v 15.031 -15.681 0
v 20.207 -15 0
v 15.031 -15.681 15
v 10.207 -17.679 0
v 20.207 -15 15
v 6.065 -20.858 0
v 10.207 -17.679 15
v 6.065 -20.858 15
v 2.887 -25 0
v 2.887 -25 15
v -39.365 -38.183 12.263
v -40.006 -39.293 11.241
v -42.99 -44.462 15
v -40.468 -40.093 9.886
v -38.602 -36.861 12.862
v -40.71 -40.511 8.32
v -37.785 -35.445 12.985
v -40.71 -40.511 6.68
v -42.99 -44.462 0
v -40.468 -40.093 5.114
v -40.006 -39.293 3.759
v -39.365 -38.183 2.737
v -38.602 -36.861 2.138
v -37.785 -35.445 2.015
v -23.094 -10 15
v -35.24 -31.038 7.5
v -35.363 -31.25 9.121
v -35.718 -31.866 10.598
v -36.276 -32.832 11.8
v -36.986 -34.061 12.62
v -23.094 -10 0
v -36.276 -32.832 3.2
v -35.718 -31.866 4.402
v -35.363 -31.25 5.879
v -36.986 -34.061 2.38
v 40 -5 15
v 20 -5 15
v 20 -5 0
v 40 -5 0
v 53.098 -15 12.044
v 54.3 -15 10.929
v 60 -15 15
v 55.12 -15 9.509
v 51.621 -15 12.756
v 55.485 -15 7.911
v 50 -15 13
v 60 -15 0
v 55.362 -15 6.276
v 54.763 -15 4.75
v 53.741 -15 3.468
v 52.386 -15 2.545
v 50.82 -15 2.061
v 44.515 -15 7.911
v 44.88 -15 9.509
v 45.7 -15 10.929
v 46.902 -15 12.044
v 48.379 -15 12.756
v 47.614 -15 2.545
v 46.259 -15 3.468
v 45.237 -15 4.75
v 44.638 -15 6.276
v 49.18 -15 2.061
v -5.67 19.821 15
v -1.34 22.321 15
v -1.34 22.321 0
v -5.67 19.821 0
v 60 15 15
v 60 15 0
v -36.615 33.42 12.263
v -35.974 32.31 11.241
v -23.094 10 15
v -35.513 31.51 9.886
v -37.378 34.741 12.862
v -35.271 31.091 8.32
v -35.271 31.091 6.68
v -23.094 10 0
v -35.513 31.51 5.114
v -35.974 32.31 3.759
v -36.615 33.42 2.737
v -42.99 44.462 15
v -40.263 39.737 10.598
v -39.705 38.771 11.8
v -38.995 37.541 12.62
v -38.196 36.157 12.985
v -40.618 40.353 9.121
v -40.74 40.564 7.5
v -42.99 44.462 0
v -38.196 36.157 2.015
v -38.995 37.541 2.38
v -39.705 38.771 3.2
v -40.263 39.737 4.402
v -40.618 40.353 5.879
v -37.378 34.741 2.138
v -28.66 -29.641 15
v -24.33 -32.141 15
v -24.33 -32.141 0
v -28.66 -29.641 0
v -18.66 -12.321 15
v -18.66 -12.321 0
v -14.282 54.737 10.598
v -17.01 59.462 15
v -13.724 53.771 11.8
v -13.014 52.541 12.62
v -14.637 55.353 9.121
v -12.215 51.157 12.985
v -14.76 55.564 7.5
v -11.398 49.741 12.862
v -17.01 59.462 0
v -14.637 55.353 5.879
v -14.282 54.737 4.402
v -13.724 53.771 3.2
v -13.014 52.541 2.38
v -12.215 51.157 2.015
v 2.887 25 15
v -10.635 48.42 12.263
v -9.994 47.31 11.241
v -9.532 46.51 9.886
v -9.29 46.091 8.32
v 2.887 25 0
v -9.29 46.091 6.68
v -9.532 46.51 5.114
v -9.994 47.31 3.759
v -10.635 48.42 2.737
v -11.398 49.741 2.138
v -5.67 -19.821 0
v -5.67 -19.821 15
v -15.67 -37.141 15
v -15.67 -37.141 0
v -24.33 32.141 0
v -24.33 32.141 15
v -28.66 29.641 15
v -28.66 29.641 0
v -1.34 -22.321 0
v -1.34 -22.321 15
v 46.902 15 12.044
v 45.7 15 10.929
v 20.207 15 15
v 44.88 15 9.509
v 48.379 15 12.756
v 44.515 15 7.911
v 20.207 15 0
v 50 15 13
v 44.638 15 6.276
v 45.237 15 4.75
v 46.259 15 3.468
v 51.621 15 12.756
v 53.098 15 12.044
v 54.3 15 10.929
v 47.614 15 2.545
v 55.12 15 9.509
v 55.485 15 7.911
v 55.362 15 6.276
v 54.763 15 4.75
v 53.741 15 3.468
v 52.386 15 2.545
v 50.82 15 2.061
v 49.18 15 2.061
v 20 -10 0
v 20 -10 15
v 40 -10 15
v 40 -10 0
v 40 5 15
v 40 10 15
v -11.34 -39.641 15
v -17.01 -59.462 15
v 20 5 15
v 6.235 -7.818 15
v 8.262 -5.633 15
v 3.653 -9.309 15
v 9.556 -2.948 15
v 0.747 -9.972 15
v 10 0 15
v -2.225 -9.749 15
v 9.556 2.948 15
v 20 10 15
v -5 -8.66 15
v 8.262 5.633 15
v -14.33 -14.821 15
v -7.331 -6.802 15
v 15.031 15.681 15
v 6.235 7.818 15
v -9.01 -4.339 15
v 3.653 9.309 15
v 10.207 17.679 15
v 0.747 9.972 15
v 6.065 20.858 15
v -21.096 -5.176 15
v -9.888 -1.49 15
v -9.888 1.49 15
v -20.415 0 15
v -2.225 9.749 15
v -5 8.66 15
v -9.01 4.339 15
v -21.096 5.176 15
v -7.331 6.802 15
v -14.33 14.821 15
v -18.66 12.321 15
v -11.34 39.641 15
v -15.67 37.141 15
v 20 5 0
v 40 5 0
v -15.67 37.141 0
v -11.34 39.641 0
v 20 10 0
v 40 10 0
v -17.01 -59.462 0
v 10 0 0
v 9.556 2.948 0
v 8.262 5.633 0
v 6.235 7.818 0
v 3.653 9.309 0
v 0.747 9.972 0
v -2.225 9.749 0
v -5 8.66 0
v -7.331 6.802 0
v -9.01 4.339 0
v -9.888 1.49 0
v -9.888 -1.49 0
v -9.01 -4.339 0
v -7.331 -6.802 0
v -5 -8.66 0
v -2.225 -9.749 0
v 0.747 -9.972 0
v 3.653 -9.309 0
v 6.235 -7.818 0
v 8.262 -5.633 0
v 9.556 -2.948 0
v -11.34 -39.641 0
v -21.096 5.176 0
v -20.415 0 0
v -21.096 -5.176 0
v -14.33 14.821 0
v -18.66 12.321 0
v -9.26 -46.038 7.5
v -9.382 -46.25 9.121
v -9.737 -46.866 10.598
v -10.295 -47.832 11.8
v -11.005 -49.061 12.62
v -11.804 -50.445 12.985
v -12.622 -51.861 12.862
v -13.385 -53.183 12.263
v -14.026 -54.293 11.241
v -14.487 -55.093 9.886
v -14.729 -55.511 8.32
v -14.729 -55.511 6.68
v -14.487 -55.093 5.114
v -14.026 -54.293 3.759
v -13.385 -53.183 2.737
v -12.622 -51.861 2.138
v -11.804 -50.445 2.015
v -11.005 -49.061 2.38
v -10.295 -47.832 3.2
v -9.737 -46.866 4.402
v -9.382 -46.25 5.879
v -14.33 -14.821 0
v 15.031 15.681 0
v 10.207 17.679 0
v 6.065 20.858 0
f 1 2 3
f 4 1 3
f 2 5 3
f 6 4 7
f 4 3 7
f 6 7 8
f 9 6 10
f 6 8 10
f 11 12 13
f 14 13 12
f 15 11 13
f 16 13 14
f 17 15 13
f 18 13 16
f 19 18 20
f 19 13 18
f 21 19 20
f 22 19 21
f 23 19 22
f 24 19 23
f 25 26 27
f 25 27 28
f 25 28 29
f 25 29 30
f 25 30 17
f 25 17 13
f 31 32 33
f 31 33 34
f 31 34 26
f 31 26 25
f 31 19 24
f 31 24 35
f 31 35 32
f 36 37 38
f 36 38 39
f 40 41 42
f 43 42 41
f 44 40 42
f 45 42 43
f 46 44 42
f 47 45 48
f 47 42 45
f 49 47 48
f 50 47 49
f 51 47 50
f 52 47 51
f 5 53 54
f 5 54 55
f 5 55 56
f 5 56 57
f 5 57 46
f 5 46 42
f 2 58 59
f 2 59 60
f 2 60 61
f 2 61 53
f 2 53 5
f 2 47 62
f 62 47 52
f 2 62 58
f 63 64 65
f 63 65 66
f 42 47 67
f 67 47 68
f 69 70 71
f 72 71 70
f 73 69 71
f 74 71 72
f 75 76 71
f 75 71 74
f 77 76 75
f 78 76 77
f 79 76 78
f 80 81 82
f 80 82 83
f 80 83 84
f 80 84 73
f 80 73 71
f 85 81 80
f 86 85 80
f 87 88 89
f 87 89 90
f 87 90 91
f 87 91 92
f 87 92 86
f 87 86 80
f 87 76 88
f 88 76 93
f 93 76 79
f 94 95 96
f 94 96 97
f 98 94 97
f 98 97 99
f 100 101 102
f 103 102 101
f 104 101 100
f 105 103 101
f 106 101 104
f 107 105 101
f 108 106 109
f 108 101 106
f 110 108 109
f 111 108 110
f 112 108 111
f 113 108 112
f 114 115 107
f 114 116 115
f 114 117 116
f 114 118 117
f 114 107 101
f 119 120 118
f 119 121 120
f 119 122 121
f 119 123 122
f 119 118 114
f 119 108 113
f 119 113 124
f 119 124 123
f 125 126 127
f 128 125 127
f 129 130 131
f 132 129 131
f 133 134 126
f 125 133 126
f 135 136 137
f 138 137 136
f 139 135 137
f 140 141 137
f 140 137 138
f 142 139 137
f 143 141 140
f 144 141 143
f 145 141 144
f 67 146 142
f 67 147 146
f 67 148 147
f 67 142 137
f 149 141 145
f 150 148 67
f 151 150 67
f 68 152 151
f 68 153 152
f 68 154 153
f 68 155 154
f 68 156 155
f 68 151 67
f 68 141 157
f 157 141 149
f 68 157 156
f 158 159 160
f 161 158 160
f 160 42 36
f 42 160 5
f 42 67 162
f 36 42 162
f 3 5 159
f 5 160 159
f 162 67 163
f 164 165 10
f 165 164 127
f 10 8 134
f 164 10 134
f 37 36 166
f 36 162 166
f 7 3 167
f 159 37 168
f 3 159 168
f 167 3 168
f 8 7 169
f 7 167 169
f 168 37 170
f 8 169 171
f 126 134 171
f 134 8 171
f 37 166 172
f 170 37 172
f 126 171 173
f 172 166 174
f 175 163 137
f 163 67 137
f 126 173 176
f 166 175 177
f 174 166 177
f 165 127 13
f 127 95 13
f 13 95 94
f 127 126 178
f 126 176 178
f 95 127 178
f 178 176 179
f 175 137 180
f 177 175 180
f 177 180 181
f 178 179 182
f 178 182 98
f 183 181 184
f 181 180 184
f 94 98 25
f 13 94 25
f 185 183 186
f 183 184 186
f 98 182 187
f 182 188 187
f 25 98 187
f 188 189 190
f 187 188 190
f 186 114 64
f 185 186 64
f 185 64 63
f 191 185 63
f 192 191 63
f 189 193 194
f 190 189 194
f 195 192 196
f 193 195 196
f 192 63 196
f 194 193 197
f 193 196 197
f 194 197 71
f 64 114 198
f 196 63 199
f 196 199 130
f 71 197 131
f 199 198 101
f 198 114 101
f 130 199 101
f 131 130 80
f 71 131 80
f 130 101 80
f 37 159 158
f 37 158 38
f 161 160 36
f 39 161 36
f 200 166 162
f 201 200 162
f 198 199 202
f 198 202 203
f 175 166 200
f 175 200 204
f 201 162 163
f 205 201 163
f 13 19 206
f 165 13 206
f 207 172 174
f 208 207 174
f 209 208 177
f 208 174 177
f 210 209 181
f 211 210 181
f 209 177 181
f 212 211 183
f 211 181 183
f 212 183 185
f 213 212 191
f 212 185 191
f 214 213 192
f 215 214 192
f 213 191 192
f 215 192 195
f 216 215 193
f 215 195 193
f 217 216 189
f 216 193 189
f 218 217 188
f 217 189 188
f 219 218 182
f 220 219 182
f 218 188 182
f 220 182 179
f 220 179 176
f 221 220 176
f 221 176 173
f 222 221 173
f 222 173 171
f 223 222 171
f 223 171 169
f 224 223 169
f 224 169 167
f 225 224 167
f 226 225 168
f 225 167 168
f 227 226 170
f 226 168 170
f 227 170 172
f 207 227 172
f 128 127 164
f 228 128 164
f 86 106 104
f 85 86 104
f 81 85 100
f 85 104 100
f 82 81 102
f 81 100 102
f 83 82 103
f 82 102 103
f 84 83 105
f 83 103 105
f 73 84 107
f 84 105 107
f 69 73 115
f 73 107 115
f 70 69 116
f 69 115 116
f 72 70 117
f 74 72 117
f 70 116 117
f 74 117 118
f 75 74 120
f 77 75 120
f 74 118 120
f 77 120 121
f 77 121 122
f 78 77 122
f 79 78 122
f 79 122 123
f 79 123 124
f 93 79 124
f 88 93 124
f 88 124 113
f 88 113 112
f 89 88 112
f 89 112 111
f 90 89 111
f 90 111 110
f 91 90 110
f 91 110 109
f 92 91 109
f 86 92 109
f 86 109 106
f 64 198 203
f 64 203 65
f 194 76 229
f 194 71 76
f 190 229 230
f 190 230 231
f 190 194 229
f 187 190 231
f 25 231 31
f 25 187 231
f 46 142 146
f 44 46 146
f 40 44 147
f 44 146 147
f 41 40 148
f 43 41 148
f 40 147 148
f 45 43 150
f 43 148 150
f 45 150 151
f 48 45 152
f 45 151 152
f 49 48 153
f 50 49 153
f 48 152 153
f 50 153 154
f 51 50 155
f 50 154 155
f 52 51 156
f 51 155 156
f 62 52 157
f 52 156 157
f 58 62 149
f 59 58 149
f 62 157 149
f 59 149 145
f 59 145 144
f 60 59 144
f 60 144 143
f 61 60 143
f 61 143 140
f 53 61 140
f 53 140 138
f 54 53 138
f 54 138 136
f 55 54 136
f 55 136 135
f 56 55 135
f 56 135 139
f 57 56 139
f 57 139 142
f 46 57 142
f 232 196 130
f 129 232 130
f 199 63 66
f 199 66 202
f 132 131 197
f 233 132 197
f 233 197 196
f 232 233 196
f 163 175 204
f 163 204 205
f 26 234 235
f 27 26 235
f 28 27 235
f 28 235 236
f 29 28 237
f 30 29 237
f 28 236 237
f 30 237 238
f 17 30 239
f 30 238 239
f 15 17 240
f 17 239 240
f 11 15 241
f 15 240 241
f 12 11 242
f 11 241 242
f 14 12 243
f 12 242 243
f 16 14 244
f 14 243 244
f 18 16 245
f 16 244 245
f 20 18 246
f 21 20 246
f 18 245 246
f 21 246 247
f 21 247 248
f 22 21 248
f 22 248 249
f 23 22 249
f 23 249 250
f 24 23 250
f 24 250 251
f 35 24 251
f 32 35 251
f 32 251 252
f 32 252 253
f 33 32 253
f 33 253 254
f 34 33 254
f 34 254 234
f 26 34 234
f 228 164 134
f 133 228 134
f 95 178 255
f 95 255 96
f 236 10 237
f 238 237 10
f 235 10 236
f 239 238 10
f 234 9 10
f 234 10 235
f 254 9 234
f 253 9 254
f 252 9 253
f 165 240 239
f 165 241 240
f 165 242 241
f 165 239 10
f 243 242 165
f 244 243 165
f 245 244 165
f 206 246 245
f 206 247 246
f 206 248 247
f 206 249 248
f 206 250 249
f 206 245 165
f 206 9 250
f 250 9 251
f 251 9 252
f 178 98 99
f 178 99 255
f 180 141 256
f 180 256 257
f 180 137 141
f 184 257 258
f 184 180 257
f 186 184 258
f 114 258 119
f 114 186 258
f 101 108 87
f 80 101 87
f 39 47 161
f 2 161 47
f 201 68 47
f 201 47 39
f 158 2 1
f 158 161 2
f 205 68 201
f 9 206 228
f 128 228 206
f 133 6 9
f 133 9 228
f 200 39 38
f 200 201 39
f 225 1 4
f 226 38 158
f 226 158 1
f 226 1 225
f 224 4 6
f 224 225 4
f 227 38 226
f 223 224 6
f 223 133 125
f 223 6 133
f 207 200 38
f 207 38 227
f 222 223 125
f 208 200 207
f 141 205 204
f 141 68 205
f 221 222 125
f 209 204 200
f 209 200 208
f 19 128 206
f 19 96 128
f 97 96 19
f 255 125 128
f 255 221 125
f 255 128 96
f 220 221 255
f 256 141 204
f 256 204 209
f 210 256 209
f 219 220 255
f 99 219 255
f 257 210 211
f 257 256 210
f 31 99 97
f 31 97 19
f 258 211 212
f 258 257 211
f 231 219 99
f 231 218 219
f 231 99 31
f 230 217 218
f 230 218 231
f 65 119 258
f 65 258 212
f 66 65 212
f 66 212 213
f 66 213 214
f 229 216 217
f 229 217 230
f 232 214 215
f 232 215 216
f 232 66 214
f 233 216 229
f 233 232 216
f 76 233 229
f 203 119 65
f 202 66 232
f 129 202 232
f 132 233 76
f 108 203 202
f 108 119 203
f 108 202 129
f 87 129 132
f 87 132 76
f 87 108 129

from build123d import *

# Parameters (mm, degrees)
BOSS_EXTRU_4_DEPTH      = 15
ESQUISSE4_R             = 10
ESQUISSE4_W             = 20
ESQUISSE4_H             = 5
ENL_V_MAT_EXTRU_3_DEPTH = 15
ESQUISSE5_R             = 5.5
ENL_V_MAT_EXTRU_4_DEPTH = 50
CONG_10_R               = 20
CONG_11_R               = 20
CONG_12_R               = 20
ESQUISSE6_R             = 5.5
ENL_V_MAT_EXTRU_5_DEPTH = 50
ESQUISSE7_R             = 5.5
ENL_V_MAT_EXTRU_6_DEPTH = 50


with BuildPart() as part:
    # Esquisse1 → Boss.-Extru.4 (new body)
    with BuildSketch(Plane.XY):
        Polygon((60, 0), (60, -15), (8.660254038, -15), (-17.009618943, -59.461524227), (-30, -51.961524227), (-42.990381057, -44.461524227), (-17.320508076, 0), (-42.990381057, 44.461524227), (-30, 51.961524227), (-17.009618943, 59.461524227), (8.660254038, 15), (60, 15), align=None)
    extrude(amount=BOSS_EXTRU_4_DEPTH)

    # Esquisse4 → Enlèv. mat.-Extru.3 (cut)
    with BuildSketch(Plane.XY.offset(15)):
        Circle(ESQUISSE4_R)
        Polygon((-11.339745962, -39.641016151), (-1.339745962, -22.320508076), (-5.669872981, -19.820508076), (-15.669872981, -37.141016151), align=None)
        with Locations((30, 7.5)):
            Rectangle(ESQUISSE4_W, ESQUISSE4_H)
        with Locations((30, -7.5)):
            Rectangle(ESQUISSE4_W, ESQUISSE4_H)
        Polygon((-24.330127019, -32.141016151), (-28.660254038, -29.641016151), (-18.660254038, -12.320508076), (-14.330127019, -14.820508076), align=None)
        Polygon((-28.660254038, 29.641016151), (-18.660254038, 12.320508076), (-14.330127019, 14.820508076), (-24.330127019, 32.141016151), align=None)
        Polygon((-15.669872981, 37.141016151), (-11.339745962, 39.641016151), (-1.339745962, 22.320508076), (-5.669872981, 19.820508076), align=None)
    extrude(amount=-ENL_V_MAT_EXTRU_3_DEPTH, mode=Mode.SUBTRACT)

    # Esquisse5 → Enlèv. mat.-Extru.4 (cut)
    with BuildSketch(Plane(origin=(12.990381057, -7.5, 0), x_dir=(0, 0, -1), z_dir=(0.8660254037844365, -0.500000000000004, 0))):
        with Locations(Location((-7.5, -50, 0), (0, 0, 90))):
            Circle(ESQUISSE5_R)
    extrude(amount=-ENL_V_MAT_EXTRU_4_DEPTH, mode=Mode.SUBTRACT)

    # Congé10
    cong_10_edges = [part.edges().sort_by_distance(p)[0] for p in [
        (8.660254038, -15, 7.5),
    ]]
    fillet(cong_10_edges, radius=CONG_10_R)

    # Congé11
    cong_11_edges = [part.edges().sort_by_distance(p)[0] for p in [
        (8.660254038, 15, 7.5),
    ]]
    fillet(cong_11_edges, radius=CONG_11_R)

    # Congé12
    cong_12_edges = [part.edges().sort_by_distance(p)[0] for p in [
        (-17.320508076, 0, 7.5),
    ]]
    fillet(cong_12_edges, radius=CONG_12_R)

    # Esquisse6 → Enlèv. mat.-Extru.5 (cut)
    with BuildSketch(Plane(origin=(12.990381057, 7.5, 0), x_dir=(0, 0, -1), z_dir=(0.8660254037844445, 0.49999999999998984, 0))):
        with Locations(Location((-7.5, 50, 0), (0, 0, 90))):
            Circle(ESQUISSE6_R)
    extrude(amount=-ENL_V_MAT_EXTRU_5_DEPTH, mode=Mode.SUBTRACT)

    # Esquisse7 → Enlèv. mat.-Extru.6 (cut)
    with BuildSketch(Plane(origin=(0, 15, 0), x_dir=(1, 0, 0), z_dir=(0, 1, 0))):
        with Locations(Location((50, -7.5, 0), (0, 0, 270))):
            Circle(ESQUISSE7_R)
    extrude(amount=-ENL_V_MAT_EXTRU_6_DEPTH, mode=Mode.SUBTRACT)


solid = part.part
